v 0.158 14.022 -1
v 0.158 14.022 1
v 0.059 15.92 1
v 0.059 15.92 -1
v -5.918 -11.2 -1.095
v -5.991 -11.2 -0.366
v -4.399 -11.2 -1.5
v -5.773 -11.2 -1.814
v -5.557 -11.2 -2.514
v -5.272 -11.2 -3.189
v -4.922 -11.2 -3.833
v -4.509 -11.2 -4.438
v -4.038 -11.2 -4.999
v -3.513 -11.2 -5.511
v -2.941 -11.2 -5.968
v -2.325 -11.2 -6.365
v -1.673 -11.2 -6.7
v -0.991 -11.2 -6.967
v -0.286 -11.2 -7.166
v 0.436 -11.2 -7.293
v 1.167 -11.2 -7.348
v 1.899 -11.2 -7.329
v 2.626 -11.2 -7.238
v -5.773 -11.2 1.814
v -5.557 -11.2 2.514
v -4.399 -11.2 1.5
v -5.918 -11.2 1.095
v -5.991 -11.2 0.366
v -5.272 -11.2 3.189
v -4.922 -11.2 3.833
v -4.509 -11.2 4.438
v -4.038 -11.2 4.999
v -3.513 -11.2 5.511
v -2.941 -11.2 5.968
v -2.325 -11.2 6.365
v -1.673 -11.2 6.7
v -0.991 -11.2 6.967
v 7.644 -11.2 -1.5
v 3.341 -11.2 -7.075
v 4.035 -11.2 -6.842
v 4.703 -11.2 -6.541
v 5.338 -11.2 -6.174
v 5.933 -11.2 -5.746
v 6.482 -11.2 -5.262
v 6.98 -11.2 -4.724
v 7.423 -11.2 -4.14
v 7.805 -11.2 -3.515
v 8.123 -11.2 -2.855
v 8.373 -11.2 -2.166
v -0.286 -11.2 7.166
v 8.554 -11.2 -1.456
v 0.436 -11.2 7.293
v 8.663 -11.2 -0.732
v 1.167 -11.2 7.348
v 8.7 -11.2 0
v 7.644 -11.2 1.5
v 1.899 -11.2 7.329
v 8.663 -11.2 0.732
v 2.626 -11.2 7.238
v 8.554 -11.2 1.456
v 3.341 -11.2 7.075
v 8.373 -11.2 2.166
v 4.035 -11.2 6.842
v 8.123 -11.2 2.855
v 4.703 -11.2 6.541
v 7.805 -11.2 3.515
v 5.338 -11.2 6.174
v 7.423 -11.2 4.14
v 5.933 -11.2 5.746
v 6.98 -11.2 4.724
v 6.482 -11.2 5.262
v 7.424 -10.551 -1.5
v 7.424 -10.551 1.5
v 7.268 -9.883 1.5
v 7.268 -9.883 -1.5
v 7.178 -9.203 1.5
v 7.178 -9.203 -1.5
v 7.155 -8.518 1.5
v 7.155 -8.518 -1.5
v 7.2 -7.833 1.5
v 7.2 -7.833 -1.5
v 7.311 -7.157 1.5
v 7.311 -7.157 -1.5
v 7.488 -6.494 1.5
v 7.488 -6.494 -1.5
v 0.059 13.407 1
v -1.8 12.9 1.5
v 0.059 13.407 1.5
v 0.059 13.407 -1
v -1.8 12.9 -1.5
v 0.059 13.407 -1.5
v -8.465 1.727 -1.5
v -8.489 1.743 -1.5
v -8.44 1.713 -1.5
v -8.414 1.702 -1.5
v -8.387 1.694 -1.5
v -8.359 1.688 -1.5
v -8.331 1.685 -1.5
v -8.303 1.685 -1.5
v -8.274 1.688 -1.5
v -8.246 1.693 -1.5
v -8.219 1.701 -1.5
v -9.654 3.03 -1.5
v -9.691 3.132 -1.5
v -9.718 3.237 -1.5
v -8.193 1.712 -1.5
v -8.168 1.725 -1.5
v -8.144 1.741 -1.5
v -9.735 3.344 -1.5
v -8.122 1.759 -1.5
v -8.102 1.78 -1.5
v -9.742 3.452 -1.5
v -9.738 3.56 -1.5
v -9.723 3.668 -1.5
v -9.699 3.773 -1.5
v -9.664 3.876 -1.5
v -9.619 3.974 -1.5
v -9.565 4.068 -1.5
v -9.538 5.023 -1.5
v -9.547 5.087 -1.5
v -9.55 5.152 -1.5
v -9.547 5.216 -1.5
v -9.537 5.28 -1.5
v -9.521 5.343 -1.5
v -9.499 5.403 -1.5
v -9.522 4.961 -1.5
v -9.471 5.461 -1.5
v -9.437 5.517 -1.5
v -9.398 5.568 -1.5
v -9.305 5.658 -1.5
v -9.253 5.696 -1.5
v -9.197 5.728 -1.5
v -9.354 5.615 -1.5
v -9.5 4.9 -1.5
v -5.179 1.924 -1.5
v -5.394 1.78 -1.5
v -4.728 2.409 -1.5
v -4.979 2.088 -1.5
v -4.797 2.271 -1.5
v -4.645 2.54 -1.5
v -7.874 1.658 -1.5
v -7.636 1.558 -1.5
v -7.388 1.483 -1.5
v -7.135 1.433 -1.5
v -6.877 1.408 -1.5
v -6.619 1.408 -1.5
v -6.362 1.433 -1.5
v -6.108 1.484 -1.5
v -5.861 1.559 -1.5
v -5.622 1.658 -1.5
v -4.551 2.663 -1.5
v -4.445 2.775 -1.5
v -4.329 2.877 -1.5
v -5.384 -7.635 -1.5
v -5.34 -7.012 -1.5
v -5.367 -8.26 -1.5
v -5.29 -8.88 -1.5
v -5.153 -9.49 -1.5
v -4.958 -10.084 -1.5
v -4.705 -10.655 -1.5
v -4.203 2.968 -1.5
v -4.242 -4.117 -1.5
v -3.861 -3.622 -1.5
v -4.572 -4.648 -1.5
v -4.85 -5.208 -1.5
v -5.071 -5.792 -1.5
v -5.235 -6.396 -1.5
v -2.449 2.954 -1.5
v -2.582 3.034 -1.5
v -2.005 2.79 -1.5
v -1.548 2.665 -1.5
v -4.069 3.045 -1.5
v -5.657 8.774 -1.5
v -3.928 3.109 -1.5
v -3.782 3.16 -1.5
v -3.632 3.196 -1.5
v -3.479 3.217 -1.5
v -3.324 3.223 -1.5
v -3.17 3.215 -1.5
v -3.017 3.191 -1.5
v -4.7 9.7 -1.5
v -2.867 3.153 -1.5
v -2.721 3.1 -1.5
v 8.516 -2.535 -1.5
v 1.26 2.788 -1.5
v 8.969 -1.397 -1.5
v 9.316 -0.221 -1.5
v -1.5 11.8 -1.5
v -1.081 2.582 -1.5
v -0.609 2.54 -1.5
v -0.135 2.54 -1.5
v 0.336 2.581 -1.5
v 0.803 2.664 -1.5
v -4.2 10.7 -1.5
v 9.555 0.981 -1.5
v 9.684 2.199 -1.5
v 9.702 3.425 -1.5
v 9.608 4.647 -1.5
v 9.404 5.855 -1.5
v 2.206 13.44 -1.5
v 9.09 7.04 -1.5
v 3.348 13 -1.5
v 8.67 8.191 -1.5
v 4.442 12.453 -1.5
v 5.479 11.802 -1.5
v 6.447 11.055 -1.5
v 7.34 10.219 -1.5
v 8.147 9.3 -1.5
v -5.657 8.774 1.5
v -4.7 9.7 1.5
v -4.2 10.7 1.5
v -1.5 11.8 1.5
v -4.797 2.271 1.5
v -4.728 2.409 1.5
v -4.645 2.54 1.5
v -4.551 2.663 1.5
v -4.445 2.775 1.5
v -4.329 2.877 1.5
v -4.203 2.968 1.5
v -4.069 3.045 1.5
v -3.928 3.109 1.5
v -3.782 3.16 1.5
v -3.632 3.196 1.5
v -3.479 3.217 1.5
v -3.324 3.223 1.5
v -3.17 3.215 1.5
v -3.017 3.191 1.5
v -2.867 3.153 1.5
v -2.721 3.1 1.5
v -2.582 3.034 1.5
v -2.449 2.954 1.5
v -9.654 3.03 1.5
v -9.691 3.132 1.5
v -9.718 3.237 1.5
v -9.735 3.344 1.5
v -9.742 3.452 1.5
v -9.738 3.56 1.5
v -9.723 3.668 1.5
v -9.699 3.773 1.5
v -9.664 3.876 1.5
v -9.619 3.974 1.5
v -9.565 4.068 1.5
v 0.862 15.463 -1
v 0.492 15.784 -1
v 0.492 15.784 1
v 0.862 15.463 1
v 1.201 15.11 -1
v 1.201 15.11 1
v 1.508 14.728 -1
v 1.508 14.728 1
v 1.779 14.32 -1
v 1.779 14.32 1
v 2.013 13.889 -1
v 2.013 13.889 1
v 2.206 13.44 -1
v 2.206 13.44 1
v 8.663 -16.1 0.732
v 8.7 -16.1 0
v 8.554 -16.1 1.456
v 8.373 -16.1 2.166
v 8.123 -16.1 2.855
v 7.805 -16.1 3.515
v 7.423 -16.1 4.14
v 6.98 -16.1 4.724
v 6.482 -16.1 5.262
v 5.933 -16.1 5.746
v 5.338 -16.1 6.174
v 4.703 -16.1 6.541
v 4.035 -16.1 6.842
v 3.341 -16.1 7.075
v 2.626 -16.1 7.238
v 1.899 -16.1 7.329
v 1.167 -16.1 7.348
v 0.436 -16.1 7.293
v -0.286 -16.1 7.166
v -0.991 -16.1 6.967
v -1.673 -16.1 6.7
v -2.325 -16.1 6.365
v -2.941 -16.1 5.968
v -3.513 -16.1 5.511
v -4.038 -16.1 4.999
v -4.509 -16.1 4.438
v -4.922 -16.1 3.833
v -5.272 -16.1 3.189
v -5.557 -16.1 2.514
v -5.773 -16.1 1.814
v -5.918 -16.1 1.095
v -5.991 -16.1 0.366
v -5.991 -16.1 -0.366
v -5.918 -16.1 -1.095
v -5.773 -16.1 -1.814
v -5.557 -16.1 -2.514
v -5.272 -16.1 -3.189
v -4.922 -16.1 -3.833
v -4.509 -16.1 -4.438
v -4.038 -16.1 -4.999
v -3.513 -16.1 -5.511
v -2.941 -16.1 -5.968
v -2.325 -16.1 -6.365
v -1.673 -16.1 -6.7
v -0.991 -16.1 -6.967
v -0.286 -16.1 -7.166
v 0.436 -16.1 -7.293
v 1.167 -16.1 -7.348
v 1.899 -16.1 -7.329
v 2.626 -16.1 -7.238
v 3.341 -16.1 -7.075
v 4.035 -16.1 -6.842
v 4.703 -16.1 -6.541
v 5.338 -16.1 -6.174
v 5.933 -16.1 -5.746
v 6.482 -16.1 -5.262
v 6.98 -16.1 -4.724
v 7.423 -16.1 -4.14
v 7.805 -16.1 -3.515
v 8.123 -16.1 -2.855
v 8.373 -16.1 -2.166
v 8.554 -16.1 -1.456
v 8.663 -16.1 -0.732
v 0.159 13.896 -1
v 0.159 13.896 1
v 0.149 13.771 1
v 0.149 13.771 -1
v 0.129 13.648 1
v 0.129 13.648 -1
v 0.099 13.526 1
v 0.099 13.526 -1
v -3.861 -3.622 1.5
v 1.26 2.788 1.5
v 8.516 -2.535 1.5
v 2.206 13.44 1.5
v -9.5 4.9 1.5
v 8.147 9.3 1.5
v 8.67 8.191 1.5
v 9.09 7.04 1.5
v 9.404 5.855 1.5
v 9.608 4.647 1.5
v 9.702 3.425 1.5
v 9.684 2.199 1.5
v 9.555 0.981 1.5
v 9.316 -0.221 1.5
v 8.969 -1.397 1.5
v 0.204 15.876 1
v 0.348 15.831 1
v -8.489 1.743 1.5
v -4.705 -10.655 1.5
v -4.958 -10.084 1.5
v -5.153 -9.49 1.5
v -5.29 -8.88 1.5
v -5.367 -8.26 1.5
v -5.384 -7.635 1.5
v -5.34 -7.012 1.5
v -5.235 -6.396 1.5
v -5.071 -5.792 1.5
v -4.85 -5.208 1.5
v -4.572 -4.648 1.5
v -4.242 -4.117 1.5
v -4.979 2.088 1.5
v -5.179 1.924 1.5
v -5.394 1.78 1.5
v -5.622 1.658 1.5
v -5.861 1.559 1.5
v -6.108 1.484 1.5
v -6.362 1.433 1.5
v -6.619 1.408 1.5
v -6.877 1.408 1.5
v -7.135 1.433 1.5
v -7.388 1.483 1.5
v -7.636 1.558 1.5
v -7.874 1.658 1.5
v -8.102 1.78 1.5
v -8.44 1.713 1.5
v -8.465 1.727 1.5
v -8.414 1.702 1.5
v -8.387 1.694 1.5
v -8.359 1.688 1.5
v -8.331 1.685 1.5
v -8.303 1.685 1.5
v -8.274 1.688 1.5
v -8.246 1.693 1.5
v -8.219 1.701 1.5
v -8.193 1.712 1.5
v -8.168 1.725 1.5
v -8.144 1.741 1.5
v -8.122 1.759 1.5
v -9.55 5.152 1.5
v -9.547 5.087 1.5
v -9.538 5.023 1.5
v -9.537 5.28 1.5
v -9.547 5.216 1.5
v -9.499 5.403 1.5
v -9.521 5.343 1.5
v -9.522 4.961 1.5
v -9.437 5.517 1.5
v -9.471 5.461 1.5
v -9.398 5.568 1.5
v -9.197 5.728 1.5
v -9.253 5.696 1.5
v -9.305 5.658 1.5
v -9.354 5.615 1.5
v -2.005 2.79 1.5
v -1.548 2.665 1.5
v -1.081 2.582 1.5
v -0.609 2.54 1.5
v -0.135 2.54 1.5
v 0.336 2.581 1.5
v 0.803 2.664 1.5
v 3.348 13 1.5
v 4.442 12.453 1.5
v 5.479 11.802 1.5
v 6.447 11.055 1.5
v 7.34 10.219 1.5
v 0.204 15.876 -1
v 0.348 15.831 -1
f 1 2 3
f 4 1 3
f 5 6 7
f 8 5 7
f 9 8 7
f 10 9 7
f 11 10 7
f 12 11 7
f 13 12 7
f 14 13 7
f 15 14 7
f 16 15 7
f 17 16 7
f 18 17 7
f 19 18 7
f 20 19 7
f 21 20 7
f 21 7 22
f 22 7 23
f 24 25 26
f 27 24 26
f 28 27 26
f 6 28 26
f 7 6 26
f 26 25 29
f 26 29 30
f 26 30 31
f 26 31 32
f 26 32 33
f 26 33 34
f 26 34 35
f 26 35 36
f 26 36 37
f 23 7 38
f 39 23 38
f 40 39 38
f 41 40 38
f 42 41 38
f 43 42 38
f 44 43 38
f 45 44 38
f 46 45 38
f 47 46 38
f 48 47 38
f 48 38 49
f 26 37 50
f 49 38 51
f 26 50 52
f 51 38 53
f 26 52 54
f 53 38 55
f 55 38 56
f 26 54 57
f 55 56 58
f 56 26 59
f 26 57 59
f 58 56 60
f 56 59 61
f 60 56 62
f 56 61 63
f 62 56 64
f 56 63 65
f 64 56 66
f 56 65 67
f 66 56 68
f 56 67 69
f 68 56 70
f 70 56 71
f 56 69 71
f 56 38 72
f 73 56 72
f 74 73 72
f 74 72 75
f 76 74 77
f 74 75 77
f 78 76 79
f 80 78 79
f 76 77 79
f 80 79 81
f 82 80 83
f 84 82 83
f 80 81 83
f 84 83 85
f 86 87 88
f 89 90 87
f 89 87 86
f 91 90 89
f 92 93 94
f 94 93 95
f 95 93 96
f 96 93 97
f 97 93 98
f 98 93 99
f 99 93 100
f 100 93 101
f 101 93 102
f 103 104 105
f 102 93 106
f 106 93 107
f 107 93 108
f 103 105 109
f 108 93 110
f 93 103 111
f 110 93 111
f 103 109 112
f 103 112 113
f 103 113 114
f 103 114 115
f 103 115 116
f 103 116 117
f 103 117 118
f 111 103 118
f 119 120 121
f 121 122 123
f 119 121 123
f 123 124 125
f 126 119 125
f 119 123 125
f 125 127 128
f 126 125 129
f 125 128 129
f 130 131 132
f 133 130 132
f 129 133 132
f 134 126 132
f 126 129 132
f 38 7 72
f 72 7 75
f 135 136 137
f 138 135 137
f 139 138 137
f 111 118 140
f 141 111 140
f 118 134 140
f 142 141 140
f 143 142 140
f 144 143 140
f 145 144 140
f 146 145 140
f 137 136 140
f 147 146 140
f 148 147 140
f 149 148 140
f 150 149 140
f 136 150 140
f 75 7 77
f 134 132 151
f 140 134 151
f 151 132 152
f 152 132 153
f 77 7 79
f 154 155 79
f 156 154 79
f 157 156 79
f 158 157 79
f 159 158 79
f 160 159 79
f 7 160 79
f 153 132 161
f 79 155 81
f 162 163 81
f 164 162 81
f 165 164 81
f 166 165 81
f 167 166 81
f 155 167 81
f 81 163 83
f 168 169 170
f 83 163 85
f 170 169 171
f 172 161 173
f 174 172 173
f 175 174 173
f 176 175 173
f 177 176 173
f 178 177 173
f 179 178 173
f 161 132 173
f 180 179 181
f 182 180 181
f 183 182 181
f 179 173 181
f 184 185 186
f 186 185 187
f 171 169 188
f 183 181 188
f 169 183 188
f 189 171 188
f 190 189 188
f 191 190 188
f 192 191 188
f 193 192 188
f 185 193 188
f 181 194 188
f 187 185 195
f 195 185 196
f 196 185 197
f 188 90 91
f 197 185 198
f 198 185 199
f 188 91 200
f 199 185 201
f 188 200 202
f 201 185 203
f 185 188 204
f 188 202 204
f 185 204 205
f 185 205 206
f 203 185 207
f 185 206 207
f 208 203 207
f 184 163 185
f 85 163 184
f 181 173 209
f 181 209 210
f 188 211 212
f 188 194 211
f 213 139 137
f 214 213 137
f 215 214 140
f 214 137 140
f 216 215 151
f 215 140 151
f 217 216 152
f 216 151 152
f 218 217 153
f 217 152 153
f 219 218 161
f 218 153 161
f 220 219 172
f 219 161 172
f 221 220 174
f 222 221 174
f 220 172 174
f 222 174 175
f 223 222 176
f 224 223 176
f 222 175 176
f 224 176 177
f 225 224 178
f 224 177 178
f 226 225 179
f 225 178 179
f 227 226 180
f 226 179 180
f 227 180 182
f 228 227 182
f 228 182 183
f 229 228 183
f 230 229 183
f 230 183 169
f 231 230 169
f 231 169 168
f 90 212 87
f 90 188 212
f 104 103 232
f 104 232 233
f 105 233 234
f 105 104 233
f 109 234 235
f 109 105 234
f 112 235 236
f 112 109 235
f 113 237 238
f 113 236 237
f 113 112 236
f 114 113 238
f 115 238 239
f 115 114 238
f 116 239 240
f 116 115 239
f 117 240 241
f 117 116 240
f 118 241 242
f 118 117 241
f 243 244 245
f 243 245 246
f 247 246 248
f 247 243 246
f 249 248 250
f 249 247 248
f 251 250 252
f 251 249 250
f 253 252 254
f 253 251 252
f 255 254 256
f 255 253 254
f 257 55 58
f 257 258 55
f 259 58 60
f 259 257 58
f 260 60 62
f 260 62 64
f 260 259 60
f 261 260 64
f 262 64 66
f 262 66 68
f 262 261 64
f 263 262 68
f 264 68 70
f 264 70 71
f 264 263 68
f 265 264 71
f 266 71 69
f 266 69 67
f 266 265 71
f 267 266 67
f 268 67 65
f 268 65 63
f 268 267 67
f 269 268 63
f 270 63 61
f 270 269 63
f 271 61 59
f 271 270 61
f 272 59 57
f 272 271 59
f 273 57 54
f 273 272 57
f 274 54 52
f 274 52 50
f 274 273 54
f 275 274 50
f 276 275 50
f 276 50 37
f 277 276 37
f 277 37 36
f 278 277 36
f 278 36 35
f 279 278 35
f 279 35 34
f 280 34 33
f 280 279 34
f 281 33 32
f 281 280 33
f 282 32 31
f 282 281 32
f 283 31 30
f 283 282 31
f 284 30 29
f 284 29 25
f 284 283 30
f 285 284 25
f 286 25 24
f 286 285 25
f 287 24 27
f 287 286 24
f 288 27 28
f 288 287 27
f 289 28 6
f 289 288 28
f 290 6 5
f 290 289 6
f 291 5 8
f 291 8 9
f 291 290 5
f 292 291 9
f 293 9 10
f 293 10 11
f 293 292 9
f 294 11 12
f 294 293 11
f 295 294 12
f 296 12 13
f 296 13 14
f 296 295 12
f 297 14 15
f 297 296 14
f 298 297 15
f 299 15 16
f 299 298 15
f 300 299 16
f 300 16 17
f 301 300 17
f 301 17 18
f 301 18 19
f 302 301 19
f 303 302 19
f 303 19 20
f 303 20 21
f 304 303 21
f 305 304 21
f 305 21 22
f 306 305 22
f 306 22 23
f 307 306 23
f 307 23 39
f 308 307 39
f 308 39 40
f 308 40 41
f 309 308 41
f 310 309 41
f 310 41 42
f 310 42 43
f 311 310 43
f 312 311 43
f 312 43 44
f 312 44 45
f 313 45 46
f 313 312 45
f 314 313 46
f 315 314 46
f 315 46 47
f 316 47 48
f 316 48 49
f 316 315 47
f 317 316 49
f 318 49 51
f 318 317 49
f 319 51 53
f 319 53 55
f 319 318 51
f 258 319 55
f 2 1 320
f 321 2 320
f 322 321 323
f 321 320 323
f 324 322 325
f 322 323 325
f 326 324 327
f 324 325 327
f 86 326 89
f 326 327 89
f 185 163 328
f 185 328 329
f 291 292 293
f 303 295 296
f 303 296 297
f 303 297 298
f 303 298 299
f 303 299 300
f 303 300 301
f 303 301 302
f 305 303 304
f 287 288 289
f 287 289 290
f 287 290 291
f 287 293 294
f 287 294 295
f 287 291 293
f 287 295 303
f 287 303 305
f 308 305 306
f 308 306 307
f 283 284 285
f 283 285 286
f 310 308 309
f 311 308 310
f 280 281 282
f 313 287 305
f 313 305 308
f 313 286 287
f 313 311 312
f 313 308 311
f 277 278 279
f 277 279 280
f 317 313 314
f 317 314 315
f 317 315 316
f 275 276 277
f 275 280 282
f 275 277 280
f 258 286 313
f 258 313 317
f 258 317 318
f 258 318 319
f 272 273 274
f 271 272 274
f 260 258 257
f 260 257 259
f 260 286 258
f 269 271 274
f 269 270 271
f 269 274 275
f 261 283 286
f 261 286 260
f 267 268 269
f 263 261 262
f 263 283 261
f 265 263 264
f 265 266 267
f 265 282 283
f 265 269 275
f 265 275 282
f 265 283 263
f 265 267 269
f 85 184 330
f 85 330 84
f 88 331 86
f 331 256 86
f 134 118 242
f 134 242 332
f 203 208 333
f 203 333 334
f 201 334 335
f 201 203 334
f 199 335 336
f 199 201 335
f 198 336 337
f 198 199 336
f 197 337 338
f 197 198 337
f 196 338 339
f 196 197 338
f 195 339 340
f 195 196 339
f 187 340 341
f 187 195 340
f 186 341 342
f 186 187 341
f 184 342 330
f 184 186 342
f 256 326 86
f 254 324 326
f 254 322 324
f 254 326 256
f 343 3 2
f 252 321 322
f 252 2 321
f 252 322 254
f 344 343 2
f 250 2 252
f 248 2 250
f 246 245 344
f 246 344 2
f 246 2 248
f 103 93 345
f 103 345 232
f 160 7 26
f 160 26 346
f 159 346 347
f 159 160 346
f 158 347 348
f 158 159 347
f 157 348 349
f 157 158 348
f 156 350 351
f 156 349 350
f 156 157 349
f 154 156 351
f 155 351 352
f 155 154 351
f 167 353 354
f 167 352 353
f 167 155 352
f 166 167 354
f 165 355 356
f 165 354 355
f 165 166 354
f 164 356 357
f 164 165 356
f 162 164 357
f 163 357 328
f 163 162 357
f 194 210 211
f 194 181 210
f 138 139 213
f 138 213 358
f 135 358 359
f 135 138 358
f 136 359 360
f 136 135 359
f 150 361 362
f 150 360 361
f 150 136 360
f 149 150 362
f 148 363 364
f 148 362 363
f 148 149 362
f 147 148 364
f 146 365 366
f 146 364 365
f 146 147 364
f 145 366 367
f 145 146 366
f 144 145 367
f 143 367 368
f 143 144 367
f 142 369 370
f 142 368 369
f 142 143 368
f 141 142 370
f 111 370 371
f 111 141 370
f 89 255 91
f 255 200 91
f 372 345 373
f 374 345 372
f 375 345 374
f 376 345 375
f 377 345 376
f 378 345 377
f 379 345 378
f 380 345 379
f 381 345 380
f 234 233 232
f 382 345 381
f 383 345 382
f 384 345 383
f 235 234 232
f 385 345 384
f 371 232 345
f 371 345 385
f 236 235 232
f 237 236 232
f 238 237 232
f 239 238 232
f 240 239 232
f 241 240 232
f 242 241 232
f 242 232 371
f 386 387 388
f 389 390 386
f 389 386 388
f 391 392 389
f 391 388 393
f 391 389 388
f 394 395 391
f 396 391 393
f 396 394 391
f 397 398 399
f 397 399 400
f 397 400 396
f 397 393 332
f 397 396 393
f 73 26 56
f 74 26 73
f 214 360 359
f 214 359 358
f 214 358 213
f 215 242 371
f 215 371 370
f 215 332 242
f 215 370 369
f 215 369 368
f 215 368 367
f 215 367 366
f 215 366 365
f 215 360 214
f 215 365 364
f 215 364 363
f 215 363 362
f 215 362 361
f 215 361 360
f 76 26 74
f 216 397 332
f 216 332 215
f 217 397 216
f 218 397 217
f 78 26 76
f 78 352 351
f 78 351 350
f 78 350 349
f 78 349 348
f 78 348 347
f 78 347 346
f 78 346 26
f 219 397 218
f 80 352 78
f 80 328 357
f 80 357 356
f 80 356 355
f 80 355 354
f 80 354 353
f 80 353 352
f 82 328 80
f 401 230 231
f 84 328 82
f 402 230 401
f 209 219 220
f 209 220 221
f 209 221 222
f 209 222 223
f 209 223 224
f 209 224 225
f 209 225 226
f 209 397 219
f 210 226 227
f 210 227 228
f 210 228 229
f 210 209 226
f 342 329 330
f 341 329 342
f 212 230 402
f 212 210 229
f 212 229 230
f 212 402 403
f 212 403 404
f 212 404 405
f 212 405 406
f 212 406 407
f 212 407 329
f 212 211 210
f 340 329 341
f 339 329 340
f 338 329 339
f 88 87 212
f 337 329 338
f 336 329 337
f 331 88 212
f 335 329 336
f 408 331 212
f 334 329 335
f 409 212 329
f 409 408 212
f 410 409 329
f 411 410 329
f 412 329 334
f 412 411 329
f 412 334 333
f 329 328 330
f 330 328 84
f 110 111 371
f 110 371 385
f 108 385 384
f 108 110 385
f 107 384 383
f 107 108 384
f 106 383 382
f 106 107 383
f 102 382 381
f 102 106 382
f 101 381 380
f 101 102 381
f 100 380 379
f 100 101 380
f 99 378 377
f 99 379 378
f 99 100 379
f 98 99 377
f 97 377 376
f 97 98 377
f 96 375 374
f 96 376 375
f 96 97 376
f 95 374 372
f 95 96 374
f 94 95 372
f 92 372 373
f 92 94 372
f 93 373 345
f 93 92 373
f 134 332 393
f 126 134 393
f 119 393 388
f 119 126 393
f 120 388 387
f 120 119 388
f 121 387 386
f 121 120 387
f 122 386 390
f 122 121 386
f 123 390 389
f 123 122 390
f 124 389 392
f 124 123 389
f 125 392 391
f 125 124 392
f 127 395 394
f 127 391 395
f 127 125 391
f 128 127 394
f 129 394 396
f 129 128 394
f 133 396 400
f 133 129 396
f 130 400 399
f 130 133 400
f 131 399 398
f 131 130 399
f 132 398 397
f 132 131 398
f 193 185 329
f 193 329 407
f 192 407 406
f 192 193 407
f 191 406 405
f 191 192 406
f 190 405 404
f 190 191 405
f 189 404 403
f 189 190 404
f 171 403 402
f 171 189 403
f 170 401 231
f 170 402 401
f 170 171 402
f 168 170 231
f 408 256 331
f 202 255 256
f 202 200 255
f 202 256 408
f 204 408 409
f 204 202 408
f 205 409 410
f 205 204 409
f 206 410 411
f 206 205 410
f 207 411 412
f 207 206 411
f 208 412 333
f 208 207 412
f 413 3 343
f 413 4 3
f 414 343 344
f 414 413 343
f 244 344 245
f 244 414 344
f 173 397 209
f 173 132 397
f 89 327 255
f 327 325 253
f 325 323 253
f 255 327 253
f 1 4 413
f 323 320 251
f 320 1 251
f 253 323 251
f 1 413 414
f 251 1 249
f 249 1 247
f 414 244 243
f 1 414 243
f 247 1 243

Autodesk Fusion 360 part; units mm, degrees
sketch "Base" plane through (0, 0, 0) normal (0, 0, 1) x (1, 0, 0)
  line L0 (1.35, -11.2) -> (8.7, -11.2)
  line L1 (8.7, -11.2) -> (8.7, -16.1)
  line L2 (8.7, -16.1) -> (1.35, -16.1)
  line L3 (1.35, -16.1) -> (1.35, -11.2)
  line L4 (1.35, -11.2) -> (1.35, -16.5) construction
revolve "Revolve1" add sketch "Base" angle 360 about axis through (1.35, -11.2, 0) along (0, -1, 0)
sketch "Sketch5" plane through (0, 0, 0) normal (0, 0, 1) x (1, 0, 0)
  line L0 (-3.8612, -3.6216) -> (1.2602, 2.7884)
  arc A0 (-2.4491, 2.9542) -> (-4.7968, 2.2709) centre (-3.3362, 1.6273) ccw
  arc A1 (-8.56, 1.8217) -> (-8.1023, 1.7795) centre (-8.3154, 1.9715) ccw
  arc A2 (-8.1023, 1.7795) -> (-4.7968, 2.2709) centre (-6.7484, 4.0355) ccw
  line L1 (-8.4888, 1.7431) -> (-9.6537, 3.0304)
  arc A3 (-9.5649, 4.0683) -> (-9.6537, 3.0304) centre (-8.6269, 3.4652) ccw
  line L2 (-9.5649, 4.0683) -> (-9.5, 4.9)
  arc A4 (-8.7221, 5.7752) -> (-9.5, 4.9) centre (-8.9, 5.15) ccw
  line L3 (-9.1971, 5.7281) -> (-5.657, 8.7735)
  arc A5 (-2.8723, 3.1545) -> (1.2602, 2.7884) centre (-0.3699, 7.8942) ccw
  line L4 (-3.8561, -11.9399) -> (7.9881, -11.9399)
  arc A6 (-3.8612, -3.6216) -> (-3.8561, -11.9399) centre (1.0426, -7.7778) ccw
  line L5 (-5.657, 8.7735) -> (-4.7, 9.7)
  line L6 (-4.7, 9.7) -> (-4.2, 10.7)
  line L7 (-4.2, 10.7) -> (-1.5, 11.8)
  line L8 (-1.5, 11.8) -> (-1.8, 12.9)
  line L9 (-1.8, 12.9) -> (0.0589, 13.407)
  line L10 (0.1583, 14.0219) -> (0.05, 16.1)
  arc A7 (0.0589, 13.407) -> (0.1571, 14.0443) centre (-1.3706, 13.9535) ccw
  arc A8 (2.2064, 13.4396) -> (0.05, 16.1) centre (-2.8988, 11.5057) ccw
  arc A9 (8.1474, 9.2996) -> (2.2064, 13.4396) centre (-1.7746, 1.394) ccw
  line L11 (8.5157, -2.5354) -> (7.2902, -7.2588)
  arc A10 (0.4921, 15.7841) -> (0.0594, 15.92) centre (-3.7578, 3.0059) ccw
  arc A11 (8.5157, -2.5354) -> (8.1474, 9.2996) centre (-3.7578, 3.0059) ccw
  arc A12 (7.4885, -6.4944) -> (7.9881, -11.9399) centre (14.1451, -8.6294) ccw
  line L12 (2.2064, 13.4396) -> (0.0589, 13.407)
extrude "Extrude1" add sketch "Sketch5" along normal mid plane 3 contours L0 A0 A1 A2 L1 A3 L2 A4 L3 A5 L4 A6 L5 L6 L7 L8 L9 A9 L11 A11 A12 L12
extrude "Extrude2" add sketch "Sketch5" along normal mid plane 2 contours L10 A7 A8 A10 L12
